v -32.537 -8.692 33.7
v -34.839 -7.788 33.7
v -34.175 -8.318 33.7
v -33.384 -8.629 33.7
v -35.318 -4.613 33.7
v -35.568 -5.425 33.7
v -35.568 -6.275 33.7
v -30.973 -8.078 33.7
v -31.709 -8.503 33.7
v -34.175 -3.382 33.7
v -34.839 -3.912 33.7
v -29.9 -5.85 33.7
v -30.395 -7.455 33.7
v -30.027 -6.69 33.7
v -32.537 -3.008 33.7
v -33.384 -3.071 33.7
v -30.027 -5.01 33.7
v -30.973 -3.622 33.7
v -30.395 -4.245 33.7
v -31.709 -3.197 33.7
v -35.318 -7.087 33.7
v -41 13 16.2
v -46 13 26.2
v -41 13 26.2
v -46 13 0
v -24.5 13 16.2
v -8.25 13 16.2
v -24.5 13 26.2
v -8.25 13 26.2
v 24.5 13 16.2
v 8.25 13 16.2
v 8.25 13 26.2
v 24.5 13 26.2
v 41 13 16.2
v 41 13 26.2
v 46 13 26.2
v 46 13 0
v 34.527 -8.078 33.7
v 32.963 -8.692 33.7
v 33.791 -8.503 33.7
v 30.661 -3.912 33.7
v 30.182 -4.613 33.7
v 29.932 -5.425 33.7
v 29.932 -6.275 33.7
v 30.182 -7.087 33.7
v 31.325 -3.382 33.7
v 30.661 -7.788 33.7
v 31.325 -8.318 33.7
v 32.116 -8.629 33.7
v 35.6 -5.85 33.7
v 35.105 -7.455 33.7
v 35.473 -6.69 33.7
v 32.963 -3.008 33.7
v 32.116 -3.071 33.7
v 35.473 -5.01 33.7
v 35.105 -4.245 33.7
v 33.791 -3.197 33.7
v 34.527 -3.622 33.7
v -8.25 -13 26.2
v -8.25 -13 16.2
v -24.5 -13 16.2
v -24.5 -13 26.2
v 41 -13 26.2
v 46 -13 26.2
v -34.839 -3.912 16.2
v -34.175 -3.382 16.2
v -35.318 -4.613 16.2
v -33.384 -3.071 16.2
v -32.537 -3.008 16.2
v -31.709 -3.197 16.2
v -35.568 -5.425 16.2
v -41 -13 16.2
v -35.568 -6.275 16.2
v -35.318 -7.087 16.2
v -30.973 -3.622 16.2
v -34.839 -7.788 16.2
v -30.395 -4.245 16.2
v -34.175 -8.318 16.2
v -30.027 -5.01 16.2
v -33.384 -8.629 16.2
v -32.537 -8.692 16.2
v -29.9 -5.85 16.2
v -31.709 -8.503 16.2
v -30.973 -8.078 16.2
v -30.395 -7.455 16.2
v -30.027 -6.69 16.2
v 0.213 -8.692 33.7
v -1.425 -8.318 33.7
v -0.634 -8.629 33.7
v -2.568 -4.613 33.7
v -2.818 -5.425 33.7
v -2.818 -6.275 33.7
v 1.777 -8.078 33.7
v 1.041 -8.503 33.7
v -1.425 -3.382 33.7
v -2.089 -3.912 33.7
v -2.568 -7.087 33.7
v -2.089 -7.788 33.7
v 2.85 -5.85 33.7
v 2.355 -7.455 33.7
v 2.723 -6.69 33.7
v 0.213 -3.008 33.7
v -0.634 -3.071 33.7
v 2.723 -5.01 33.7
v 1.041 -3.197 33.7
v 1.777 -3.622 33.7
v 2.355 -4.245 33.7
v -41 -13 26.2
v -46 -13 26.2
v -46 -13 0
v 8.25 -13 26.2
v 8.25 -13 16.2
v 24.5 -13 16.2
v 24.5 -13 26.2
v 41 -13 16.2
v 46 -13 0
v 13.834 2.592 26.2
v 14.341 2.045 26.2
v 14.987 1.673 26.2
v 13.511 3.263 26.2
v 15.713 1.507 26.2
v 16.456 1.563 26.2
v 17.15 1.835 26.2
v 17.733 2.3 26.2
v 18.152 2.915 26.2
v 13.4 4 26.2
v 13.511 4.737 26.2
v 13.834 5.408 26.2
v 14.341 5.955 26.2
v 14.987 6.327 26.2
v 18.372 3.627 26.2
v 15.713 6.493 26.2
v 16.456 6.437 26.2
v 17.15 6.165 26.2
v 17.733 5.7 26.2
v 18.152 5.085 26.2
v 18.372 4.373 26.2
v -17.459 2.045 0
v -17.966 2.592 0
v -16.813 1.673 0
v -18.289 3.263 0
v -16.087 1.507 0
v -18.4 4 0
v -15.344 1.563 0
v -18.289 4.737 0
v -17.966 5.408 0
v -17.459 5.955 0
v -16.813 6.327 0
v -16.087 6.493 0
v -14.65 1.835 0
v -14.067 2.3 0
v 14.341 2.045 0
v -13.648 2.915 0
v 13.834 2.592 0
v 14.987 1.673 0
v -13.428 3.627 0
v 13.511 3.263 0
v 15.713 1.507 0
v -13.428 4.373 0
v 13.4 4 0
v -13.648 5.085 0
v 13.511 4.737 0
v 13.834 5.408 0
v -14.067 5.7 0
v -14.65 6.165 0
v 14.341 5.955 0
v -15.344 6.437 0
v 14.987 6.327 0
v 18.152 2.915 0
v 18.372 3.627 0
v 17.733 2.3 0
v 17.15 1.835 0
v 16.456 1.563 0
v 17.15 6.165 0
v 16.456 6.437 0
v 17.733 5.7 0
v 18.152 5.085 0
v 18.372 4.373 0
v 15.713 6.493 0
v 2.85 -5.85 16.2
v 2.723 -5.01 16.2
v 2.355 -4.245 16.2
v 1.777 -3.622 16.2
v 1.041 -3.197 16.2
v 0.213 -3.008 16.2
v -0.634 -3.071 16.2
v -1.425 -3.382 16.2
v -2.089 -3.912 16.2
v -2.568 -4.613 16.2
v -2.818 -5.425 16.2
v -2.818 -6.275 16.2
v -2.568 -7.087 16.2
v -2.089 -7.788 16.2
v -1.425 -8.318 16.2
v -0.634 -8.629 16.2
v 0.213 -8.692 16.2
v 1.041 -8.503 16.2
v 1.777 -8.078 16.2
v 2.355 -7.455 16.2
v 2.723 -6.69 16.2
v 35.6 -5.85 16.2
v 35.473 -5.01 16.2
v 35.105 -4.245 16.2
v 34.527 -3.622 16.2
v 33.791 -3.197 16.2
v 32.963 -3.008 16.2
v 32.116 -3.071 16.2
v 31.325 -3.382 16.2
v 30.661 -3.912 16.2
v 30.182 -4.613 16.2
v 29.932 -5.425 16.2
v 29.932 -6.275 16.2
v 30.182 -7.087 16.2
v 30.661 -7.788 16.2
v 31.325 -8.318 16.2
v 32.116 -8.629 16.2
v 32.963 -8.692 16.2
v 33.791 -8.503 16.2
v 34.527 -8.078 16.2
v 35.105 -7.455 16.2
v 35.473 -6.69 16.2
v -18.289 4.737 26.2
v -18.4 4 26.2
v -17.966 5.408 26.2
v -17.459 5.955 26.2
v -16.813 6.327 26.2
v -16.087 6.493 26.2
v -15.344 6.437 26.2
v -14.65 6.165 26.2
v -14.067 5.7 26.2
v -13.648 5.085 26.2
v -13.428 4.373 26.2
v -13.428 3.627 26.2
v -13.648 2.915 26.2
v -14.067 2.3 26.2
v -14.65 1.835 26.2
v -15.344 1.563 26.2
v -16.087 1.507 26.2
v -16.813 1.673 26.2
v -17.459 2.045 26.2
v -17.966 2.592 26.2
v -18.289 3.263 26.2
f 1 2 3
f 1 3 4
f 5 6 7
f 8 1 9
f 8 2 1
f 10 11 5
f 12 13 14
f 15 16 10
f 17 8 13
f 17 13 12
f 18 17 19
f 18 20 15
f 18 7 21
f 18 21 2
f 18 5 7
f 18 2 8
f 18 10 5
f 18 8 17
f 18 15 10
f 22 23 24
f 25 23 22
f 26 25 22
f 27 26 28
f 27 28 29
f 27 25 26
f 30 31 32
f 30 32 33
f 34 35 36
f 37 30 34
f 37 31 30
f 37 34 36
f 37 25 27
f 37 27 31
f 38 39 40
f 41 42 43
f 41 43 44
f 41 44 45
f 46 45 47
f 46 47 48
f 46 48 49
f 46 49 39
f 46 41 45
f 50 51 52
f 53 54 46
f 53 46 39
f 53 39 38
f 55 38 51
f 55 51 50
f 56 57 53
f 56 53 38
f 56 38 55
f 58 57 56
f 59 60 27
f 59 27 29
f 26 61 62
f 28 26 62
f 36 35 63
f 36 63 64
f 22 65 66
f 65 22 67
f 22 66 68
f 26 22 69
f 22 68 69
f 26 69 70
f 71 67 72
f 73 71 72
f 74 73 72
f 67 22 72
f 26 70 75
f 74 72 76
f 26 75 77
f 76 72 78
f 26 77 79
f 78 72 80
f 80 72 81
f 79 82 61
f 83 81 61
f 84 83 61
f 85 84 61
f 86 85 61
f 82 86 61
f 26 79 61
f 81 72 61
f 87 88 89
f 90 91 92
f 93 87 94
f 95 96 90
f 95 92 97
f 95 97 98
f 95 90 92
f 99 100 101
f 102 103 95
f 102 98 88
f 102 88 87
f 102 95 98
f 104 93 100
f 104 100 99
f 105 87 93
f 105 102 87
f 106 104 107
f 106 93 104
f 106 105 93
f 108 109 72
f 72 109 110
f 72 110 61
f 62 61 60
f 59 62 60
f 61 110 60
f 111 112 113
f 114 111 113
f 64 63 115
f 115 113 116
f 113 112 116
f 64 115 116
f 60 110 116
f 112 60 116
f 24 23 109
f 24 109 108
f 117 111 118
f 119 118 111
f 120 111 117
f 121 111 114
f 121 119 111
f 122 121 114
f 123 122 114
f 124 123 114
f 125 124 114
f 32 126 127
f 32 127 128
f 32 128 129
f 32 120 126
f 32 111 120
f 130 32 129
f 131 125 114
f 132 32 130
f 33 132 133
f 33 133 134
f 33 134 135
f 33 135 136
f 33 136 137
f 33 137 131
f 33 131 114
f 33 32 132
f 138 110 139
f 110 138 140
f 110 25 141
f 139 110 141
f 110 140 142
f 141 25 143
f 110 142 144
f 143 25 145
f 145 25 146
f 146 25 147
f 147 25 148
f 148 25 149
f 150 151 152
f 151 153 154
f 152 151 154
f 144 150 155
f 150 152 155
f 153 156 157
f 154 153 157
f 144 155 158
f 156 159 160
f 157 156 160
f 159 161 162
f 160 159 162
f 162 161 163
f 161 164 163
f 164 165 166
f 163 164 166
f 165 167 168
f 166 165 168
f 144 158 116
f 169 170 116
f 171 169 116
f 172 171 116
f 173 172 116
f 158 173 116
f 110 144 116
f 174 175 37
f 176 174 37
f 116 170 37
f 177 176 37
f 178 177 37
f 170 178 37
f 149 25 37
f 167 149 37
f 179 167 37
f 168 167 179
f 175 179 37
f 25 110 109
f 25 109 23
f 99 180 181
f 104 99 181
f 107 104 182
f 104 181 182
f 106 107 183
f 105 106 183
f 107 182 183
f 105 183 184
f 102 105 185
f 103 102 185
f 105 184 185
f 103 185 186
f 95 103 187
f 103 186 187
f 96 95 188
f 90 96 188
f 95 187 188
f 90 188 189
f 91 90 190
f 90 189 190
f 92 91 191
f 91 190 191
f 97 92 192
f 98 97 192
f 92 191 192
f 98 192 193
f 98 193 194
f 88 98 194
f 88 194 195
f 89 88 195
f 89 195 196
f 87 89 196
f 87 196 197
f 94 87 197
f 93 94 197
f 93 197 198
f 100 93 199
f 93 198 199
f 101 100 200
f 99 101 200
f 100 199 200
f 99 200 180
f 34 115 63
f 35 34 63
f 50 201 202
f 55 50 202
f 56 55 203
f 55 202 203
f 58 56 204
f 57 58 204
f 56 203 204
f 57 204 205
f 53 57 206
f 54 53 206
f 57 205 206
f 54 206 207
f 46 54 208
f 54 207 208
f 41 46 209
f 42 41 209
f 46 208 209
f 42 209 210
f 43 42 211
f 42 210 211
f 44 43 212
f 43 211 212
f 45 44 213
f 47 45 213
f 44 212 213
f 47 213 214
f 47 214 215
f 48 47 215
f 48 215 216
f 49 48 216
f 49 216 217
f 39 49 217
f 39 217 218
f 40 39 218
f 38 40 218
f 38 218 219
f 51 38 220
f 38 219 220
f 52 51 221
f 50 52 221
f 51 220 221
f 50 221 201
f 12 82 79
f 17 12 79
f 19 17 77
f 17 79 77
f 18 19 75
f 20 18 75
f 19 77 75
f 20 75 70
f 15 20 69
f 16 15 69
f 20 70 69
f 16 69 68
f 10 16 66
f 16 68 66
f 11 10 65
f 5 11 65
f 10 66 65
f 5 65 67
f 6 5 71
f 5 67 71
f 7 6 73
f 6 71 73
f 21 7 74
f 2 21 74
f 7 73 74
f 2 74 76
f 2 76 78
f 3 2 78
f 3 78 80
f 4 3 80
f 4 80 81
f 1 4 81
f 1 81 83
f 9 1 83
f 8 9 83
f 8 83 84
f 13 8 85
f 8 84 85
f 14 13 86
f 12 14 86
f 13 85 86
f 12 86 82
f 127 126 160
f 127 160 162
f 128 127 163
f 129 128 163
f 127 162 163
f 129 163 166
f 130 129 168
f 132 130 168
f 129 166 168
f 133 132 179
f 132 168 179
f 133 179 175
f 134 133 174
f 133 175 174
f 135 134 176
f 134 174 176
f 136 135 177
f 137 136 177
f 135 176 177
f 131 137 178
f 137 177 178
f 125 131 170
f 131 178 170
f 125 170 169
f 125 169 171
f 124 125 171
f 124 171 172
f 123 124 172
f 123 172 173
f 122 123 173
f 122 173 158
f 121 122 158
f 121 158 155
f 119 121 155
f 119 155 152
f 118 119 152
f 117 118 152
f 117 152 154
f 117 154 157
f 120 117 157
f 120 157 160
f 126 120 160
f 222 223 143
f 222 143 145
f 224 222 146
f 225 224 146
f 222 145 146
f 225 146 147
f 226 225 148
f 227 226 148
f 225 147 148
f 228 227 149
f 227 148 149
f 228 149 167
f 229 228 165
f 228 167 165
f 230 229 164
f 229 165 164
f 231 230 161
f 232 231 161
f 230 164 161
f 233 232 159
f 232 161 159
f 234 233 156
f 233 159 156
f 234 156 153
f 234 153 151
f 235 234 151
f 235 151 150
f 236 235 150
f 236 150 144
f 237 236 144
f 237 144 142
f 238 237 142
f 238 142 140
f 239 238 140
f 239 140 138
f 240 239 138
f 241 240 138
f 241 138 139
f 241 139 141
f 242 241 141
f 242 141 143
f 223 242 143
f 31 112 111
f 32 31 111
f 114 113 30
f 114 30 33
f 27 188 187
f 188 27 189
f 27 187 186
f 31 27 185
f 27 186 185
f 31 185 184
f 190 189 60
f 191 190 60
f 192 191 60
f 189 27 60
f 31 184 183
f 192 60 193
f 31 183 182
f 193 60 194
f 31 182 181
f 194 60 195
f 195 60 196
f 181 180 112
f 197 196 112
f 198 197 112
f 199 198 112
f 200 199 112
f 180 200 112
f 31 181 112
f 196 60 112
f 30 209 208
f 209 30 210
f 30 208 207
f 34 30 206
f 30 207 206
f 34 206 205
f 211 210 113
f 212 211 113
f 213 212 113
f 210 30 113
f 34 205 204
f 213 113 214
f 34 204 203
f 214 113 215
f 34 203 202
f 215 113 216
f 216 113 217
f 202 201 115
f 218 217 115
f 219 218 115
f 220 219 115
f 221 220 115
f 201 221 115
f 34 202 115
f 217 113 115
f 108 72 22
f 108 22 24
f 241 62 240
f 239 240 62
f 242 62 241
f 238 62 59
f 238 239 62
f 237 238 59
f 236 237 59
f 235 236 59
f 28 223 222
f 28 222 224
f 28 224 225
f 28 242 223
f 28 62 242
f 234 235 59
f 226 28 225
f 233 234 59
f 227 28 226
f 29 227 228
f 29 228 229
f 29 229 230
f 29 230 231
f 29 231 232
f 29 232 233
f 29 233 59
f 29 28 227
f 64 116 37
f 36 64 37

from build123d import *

# Parameters (mm, degrees)
ESBO_O1_W                = 92
ESBO_O1_H                = 26
RESSALTO_EXTRUS_O1_DEPTH = 26.2
ESBO_O2_W                = 16.5
ESBO_O2_H                = 10
CORTE_EXTRUS_O1_DEPTH    = 27
ESBO_O3_R                = 2.5
CORTE_EXTRUS_O2_DEPTH    = 27.2
ESBO_O4_R                = 2.85
RESSALTO_EXTRUS_O2_DEPTH = 17.5


with BuildPart() as part:
    # Esboço1 → Ressalto-extrusão1 (new body)
    with BuildSketch(Plane.XY):
        Rectangle(ESBO_O1_W, ESBO_O1_H)
    extrude(amount=RESSALTO_EXTRUS_O1_DEPTH)

    # Esboço2 → Corte-extrusão1 (cut, through all)
    with BuildSketch(Plane.XZ.offset(13)):
        with Locations((-32.75, 21.2)):
            Rectangle(ESBO_O2_W, ESBO_O2_H)
        with Locations((0, 21.2)):
            Rectangle(ESBO_O2_W, ESBO_O2_H)
        with Locations((32.75, 21.2)):
            Rectangle(ESBO_O2_W, ESBO_O2_H)
    extrude(amount=-CORTE_EXTRUS_O1_DEPTH, mode=Mode.SUBTRACT)

    # Esboço3 → Corte-extrusão2 (cut, through all)
    with BuildSketch(Plane(origin=(0, 0, 0), x_dir=(-1, 0, 0), z_dir=(0, 0, -1))):
        with Locations((-15.9, 4)):
            Circle(ESBO_O3_R)
        with Locations((15.9, 4)):
            Circle(ESBO_O3_R)
    extrude(amount=-CORTE_EXTRUS_O2_DEPTH, mode=Mode.SUBTRACT)

    # Esboço4 → Ressalto-extrusão2 (add)
    with BuildSketch(Plane.XY.offset(16.2)):
        with Locations((0, -5.85)):
            Circle(ESBO_O4_R)
        with Locations((32.75, -5.85)):
            Circle(ESBO_O4_R)
        with Locations((-32.75, -5.85)):
            Circle(ESBO_O4_R)
    extrude(amount=RESSALTO_EXTRUS_O2_DEPTH)


solid = part.part
